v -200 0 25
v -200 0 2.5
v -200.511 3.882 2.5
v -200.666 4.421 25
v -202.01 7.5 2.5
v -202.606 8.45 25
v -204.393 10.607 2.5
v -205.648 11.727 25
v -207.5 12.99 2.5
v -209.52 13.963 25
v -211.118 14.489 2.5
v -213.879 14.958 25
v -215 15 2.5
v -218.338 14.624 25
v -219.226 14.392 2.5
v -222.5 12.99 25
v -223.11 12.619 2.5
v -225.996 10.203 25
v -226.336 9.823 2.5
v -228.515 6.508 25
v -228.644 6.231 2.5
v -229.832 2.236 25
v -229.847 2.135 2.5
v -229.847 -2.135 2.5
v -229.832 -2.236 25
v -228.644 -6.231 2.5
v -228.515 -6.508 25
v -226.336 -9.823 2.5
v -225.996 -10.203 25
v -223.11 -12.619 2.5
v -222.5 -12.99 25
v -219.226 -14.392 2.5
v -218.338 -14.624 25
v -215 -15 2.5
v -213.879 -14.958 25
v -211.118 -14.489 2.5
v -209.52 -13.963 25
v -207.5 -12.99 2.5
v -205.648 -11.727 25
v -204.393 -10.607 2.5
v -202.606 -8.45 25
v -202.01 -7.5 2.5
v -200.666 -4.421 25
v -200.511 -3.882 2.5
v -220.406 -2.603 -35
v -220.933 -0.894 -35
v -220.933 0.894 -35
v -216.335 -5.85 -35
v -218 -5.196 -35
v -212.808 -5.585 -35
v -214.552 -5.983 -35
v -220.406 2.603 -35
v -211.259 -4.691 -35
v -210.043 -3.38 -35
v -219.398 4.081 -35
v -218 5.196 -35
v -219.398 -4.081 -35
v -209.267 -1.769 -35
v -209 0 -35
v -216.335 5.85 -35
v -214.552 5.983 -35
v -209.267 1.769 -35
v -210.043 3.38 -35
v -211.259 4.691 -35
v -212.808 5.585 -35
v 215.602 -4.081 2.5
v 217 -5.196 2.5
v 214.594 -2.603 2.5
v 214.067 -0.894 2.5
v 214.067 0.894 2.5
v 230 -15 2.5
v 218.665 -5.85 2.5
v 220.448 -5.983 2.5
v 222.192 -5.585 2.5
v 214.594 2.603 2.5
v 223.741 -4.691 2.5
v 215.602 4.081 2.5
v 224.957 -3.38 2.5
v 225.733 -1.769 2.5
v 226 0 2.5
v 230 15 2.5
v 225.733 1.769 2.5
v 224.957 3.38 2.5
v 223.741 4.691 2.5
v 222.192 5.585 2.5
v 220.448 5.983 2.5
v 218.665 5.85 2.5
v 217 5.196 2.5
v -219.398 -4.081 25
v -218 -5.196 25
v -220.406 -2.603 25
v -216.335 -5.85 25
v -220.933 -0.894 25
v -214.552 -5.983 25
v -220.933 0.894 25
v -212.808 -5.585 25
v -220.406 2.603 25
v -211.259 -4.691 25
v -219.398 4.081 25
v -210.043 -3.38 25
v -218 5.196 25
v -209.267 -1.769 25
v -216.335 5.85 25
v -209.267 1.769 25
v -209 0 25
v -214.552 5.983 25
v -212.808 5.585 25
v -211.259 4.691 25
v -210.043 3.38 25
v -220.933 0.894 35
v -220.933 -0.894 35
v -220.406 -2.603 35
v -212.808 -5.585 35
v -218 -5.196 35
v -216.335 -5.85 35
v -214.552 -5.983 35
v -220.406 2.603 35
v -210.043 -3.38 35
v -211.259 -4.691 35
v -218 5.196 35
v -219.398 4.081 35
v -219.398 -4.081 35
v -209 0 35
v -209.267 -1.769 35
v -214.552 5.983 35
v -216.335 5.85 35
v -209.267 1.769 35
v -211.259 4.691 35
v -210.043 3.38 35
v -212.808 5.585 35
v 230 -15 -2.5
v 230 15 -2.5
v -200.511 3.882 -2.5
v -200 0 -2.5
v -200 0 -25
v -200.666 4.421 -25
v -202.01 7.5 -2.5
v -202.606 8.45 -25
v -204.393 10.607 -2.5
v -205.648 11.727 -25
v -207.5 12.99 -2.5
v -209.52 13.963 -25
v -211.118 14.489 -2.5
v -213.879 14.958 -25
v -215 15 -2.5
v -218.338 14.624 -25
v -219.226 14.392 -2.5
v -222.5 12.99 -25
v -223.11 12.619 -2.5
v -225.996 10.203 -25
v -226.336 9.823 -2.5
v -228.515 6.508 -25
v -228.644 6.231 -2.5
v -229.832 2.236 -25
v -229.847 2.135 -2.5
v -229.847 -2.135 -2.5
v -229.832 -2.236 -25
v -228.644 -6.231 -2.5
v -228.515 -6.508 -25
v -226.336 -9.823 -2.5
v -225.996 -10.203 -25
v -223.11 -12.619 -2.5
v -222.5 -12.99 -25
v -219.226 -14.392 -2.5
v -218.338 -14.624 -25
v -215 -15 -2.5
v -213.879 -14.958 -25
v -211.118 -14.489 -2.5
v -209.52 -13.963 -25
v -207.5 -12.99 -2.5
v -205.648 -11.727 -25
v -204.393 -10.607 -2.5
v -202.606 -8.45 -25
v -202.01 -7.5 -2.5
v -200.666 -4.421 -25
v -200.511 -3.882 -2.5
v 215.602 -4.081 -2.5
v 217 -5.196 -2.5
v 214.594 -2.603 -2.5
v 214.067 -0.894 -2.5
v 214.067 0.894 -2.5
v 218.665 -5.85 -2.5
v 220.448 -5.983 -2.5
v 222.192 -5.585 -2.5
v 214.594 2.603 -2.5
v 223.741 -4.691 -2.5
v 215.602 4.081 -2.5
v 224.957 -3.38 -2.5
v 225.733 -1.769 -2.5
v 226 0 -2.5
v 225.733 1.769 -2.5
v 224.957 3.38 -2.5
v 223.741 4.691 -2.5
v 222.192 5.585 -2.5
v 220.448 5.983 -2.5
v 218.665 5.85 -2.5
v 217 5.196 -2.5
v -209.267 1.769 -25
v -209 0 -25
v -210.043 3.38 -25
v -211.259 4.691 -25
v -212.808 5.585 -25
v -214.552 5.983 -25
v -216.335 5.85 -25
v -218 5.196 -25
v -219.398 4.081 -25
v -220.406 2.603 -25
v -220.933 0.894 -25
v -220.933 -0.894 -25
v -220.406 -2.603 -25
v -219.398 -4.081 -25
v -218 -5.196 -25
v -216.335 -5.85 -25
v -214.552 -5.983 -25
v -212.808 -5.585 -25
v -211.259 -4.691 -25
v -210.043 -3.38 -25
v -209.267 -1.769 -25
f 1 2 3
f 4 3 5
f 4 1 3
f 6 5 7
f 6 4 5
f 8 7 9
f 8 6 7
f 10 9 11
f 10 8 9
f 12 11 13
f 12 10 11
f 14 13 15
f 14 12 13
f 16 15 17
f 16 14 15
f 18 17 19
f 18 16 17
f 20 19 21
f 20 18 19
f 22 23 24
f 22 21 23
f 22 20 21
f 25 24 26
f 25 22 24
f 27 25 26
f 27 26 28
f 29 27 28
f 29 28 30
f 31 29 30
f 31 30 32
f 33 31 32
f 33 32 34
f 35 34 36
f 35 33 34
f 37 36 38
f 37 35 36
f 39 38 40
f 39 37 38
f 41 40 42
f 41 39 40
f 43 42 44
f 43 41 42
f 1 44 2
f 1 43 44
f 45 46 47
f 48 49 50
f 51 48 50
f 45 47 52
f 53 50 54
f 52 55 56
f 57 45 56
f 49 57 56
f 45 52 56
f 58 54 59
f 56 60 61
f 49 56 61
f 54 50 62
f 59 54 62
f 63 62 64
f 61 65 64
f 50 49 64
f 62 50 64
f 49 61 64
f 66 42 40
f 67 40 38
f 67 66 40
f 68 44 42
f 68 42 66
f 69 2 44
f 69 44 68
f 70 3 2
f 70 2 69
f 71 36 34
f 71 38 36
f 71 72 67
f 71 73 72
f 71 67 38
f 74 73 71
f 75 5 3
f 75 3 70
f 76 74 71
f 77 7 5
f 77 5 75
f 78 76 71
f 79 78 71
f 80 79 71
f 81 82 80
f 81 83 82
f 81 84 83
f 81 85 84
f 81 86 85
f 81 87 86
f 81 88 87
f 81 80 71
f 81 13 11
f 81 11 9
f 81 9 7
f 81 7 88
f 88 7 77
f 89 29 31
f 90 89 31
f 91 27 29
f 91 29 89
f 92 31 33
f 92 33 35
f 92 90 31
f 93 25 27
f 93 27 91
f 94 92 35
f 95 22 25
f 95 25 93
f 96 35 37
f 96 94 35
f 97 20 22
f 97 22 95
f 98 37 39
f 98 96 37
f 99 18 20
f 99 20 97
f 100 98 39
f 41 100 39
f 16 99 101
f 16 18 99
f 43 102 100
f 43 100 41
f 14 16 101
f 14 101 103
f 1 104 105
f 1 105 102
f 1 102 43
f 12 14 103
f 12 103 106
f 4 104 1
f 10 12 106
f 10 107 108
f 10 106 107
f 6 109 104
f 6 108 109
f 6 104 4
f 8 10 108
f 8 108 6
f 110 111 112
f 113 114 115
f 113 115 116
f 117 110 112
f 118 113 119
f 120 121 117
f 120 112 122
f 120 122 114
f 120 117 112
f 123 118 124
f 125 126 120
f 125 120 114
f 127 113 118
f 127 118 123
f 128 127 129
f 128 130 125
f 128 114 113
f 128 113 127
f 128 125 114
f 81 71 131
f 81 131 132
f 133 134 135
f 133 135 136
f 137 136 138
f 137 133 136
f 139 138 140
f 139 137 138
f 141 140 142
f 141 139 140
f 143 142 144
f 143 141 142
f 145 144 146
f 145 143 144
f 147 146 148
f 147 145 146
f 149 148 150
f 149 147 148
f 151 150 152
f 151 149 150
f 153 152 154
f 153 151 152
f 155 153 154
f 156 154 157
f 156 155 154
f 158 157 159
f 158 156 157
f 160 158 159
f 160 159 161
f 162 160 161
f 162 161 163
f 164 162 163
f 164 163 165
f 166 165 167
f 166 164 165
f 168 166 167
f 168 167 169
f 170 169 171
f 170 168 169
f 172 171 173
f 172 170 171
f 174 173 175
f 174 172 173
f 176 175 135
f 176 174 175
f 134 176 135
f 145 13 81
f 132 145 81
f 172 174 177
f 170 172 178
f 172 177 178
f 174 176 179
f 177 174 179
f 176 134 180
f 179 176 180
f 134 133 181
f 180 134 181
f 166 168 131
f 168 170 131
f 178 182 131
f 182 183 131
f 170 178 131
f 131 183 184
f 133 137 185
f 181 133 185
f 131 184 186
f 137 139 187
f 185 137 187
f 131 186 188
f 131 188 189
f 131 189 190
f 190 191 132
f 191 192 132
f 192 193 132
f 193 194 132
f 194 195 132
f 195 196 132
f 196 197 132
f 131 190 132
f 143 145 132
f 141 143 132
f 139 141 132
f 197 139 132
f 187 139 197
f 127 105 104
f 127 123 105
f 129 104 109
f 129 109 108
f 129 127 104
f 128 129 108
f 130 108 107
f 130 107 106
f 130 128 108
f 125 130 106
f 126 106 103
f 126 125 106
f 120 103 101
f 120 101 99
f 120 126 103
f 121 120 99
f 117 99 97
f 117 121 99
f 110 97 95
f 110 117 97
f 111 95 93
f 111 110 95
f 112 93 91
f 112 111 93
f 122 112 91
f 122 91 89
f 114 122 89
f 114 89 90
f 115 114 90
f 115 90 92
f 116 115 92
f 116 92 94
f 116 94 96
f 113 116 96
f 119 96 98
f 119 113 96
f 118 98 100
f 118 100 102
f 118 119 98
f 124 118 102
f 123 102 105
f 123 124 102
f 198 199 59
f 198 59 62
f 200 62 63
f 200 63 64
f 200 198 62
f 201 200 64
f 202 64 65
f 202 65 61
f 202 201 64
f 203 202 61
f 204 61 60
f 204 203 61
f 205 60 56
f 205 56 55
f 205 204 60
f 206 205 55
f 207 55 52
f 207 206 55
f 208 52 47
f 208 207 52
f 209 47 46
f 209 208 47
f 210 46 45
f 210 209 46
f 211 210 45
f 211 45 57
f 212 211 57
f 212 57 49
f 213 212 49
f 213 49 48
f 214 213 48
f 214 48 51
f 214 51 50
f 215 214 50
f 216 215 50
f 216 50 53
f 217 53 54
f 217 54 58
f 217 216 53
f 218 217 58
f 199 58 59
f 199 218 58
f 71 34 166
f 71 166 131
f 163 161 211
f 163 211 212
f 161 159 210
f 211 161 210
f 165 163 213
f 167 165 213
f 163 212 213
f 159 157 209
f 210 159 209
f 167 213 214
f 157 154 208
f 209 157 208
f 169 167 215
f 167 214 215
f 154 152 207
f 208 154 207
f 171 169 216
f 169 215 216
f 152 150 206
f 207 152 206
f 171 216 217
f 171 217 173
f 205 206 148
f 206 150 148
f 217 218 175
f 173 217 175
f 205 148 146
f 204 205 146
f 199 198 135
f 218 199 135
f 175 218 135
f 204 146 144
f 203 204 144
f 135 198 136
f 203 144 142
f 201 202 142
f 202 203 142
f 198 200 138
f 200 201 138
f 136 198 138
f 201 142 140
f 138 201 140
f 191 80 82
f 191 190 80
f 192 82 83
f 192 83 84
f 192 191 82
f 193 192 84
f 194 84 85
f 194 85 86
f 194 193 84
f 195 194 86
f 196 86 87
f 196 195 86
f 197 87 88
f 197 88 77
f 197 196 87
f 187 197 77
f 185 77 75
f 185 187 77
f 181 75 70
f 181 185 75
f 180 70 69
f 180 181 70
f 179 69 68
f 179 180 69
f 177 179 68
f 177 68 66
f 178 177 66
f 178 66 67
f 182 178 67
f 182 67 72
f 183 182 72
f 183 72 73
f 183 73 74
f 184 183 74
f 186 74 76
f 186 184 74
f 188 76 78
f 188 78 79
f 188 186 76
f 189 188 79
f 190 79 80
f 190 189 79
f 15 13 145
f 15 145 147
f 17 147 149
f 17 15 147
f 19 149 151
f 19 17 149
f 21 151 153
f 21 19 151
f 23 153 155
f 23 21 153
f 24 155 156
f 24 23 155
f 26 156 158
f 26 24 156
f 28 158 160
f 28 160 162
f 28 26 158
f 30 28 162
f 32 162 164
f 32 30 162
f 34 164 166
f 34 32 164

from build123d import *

# Parameters (mm, degrees)
SKETCH_1_W      = 460
SKETCH_1_H      = 30
SKETCH_1_R      = 6
EXTRUDE_1_DEPTH = 2.5
FILLET_1_RADIUS = 15
FILLET_1_LENGTH = 5
SKETCH_3_R      = 15
EXTRUDE_2_DEPTH = 25
SKETCH_4_R      = 6
EXTRUDE_3_DEPTH = 35


with BuildPart() as part:
    # 草图1 → 凸台-拉伸1 (new, symmetric)
    with BuildSketch(Plane.XY):
        Rectangle(SKETCH_1_W, SKETCH_1_H)
        with Locations((-220, 0)):
            Circle(SKETCH_1_R, mode=Mode.SUBTRACT)
        with Locations((220, 0)):
            Circle(SKETCH_1_R, mode=Mode.SUBTRACT)
    extrude(amount=EXTRUDE_1_DEPTH, both=True)

    # 圆角1: full round fillet: the end face becomes a half cylinder, R = half its width
    fillet_1_face = Plane((-230, 0, 0), x_dir=(0, 0, 1), z_dir=(-1, 0, 0))  # on the end face: x along it, z out of the body
    fillet_1_slab = fillet_1_face.offset(-FILLET_1_RADIUS / 2) * Box(FILLET_1_LENGTH, 2 * FILLET_1_RADIUS, FILLET_1_RADIUS, mode=Mode.PRIVATE)  # the body's end, R deep
    fillet_1_round = Plane((-215, 0, 0), x_dir=(-1, 0, 0), z_dir=(0, 0, 1)) * Cylinder(FILLET_1_RADIUS, FILLET_1_LENGTH, mode=Mode.PRIVATE)  # its axis R under the face
    add(fillet_1_slab - fillet_1_round, mode=Mode.SUBTRACT)

    # 草图3 → 凸台-拉伸2 (add, symmetric)
    with BuildSketch(Plane.XY):
        with Locations((-215, 0)):
            Circle(SKETCH_3_R)
    extrude(amount=EXTRUDE_2_DEPTH, both=True)

    # 草图4 → 凸台-拉伸3 (add, symmetric)
    with BuildSketch(Plane.XY):
        with Locations((-215, 0)):
            Circle(SKETCH_4_R)
    extrude(amount=EXTRUDE_3_DEPTH, both=True)


solid = part.part
